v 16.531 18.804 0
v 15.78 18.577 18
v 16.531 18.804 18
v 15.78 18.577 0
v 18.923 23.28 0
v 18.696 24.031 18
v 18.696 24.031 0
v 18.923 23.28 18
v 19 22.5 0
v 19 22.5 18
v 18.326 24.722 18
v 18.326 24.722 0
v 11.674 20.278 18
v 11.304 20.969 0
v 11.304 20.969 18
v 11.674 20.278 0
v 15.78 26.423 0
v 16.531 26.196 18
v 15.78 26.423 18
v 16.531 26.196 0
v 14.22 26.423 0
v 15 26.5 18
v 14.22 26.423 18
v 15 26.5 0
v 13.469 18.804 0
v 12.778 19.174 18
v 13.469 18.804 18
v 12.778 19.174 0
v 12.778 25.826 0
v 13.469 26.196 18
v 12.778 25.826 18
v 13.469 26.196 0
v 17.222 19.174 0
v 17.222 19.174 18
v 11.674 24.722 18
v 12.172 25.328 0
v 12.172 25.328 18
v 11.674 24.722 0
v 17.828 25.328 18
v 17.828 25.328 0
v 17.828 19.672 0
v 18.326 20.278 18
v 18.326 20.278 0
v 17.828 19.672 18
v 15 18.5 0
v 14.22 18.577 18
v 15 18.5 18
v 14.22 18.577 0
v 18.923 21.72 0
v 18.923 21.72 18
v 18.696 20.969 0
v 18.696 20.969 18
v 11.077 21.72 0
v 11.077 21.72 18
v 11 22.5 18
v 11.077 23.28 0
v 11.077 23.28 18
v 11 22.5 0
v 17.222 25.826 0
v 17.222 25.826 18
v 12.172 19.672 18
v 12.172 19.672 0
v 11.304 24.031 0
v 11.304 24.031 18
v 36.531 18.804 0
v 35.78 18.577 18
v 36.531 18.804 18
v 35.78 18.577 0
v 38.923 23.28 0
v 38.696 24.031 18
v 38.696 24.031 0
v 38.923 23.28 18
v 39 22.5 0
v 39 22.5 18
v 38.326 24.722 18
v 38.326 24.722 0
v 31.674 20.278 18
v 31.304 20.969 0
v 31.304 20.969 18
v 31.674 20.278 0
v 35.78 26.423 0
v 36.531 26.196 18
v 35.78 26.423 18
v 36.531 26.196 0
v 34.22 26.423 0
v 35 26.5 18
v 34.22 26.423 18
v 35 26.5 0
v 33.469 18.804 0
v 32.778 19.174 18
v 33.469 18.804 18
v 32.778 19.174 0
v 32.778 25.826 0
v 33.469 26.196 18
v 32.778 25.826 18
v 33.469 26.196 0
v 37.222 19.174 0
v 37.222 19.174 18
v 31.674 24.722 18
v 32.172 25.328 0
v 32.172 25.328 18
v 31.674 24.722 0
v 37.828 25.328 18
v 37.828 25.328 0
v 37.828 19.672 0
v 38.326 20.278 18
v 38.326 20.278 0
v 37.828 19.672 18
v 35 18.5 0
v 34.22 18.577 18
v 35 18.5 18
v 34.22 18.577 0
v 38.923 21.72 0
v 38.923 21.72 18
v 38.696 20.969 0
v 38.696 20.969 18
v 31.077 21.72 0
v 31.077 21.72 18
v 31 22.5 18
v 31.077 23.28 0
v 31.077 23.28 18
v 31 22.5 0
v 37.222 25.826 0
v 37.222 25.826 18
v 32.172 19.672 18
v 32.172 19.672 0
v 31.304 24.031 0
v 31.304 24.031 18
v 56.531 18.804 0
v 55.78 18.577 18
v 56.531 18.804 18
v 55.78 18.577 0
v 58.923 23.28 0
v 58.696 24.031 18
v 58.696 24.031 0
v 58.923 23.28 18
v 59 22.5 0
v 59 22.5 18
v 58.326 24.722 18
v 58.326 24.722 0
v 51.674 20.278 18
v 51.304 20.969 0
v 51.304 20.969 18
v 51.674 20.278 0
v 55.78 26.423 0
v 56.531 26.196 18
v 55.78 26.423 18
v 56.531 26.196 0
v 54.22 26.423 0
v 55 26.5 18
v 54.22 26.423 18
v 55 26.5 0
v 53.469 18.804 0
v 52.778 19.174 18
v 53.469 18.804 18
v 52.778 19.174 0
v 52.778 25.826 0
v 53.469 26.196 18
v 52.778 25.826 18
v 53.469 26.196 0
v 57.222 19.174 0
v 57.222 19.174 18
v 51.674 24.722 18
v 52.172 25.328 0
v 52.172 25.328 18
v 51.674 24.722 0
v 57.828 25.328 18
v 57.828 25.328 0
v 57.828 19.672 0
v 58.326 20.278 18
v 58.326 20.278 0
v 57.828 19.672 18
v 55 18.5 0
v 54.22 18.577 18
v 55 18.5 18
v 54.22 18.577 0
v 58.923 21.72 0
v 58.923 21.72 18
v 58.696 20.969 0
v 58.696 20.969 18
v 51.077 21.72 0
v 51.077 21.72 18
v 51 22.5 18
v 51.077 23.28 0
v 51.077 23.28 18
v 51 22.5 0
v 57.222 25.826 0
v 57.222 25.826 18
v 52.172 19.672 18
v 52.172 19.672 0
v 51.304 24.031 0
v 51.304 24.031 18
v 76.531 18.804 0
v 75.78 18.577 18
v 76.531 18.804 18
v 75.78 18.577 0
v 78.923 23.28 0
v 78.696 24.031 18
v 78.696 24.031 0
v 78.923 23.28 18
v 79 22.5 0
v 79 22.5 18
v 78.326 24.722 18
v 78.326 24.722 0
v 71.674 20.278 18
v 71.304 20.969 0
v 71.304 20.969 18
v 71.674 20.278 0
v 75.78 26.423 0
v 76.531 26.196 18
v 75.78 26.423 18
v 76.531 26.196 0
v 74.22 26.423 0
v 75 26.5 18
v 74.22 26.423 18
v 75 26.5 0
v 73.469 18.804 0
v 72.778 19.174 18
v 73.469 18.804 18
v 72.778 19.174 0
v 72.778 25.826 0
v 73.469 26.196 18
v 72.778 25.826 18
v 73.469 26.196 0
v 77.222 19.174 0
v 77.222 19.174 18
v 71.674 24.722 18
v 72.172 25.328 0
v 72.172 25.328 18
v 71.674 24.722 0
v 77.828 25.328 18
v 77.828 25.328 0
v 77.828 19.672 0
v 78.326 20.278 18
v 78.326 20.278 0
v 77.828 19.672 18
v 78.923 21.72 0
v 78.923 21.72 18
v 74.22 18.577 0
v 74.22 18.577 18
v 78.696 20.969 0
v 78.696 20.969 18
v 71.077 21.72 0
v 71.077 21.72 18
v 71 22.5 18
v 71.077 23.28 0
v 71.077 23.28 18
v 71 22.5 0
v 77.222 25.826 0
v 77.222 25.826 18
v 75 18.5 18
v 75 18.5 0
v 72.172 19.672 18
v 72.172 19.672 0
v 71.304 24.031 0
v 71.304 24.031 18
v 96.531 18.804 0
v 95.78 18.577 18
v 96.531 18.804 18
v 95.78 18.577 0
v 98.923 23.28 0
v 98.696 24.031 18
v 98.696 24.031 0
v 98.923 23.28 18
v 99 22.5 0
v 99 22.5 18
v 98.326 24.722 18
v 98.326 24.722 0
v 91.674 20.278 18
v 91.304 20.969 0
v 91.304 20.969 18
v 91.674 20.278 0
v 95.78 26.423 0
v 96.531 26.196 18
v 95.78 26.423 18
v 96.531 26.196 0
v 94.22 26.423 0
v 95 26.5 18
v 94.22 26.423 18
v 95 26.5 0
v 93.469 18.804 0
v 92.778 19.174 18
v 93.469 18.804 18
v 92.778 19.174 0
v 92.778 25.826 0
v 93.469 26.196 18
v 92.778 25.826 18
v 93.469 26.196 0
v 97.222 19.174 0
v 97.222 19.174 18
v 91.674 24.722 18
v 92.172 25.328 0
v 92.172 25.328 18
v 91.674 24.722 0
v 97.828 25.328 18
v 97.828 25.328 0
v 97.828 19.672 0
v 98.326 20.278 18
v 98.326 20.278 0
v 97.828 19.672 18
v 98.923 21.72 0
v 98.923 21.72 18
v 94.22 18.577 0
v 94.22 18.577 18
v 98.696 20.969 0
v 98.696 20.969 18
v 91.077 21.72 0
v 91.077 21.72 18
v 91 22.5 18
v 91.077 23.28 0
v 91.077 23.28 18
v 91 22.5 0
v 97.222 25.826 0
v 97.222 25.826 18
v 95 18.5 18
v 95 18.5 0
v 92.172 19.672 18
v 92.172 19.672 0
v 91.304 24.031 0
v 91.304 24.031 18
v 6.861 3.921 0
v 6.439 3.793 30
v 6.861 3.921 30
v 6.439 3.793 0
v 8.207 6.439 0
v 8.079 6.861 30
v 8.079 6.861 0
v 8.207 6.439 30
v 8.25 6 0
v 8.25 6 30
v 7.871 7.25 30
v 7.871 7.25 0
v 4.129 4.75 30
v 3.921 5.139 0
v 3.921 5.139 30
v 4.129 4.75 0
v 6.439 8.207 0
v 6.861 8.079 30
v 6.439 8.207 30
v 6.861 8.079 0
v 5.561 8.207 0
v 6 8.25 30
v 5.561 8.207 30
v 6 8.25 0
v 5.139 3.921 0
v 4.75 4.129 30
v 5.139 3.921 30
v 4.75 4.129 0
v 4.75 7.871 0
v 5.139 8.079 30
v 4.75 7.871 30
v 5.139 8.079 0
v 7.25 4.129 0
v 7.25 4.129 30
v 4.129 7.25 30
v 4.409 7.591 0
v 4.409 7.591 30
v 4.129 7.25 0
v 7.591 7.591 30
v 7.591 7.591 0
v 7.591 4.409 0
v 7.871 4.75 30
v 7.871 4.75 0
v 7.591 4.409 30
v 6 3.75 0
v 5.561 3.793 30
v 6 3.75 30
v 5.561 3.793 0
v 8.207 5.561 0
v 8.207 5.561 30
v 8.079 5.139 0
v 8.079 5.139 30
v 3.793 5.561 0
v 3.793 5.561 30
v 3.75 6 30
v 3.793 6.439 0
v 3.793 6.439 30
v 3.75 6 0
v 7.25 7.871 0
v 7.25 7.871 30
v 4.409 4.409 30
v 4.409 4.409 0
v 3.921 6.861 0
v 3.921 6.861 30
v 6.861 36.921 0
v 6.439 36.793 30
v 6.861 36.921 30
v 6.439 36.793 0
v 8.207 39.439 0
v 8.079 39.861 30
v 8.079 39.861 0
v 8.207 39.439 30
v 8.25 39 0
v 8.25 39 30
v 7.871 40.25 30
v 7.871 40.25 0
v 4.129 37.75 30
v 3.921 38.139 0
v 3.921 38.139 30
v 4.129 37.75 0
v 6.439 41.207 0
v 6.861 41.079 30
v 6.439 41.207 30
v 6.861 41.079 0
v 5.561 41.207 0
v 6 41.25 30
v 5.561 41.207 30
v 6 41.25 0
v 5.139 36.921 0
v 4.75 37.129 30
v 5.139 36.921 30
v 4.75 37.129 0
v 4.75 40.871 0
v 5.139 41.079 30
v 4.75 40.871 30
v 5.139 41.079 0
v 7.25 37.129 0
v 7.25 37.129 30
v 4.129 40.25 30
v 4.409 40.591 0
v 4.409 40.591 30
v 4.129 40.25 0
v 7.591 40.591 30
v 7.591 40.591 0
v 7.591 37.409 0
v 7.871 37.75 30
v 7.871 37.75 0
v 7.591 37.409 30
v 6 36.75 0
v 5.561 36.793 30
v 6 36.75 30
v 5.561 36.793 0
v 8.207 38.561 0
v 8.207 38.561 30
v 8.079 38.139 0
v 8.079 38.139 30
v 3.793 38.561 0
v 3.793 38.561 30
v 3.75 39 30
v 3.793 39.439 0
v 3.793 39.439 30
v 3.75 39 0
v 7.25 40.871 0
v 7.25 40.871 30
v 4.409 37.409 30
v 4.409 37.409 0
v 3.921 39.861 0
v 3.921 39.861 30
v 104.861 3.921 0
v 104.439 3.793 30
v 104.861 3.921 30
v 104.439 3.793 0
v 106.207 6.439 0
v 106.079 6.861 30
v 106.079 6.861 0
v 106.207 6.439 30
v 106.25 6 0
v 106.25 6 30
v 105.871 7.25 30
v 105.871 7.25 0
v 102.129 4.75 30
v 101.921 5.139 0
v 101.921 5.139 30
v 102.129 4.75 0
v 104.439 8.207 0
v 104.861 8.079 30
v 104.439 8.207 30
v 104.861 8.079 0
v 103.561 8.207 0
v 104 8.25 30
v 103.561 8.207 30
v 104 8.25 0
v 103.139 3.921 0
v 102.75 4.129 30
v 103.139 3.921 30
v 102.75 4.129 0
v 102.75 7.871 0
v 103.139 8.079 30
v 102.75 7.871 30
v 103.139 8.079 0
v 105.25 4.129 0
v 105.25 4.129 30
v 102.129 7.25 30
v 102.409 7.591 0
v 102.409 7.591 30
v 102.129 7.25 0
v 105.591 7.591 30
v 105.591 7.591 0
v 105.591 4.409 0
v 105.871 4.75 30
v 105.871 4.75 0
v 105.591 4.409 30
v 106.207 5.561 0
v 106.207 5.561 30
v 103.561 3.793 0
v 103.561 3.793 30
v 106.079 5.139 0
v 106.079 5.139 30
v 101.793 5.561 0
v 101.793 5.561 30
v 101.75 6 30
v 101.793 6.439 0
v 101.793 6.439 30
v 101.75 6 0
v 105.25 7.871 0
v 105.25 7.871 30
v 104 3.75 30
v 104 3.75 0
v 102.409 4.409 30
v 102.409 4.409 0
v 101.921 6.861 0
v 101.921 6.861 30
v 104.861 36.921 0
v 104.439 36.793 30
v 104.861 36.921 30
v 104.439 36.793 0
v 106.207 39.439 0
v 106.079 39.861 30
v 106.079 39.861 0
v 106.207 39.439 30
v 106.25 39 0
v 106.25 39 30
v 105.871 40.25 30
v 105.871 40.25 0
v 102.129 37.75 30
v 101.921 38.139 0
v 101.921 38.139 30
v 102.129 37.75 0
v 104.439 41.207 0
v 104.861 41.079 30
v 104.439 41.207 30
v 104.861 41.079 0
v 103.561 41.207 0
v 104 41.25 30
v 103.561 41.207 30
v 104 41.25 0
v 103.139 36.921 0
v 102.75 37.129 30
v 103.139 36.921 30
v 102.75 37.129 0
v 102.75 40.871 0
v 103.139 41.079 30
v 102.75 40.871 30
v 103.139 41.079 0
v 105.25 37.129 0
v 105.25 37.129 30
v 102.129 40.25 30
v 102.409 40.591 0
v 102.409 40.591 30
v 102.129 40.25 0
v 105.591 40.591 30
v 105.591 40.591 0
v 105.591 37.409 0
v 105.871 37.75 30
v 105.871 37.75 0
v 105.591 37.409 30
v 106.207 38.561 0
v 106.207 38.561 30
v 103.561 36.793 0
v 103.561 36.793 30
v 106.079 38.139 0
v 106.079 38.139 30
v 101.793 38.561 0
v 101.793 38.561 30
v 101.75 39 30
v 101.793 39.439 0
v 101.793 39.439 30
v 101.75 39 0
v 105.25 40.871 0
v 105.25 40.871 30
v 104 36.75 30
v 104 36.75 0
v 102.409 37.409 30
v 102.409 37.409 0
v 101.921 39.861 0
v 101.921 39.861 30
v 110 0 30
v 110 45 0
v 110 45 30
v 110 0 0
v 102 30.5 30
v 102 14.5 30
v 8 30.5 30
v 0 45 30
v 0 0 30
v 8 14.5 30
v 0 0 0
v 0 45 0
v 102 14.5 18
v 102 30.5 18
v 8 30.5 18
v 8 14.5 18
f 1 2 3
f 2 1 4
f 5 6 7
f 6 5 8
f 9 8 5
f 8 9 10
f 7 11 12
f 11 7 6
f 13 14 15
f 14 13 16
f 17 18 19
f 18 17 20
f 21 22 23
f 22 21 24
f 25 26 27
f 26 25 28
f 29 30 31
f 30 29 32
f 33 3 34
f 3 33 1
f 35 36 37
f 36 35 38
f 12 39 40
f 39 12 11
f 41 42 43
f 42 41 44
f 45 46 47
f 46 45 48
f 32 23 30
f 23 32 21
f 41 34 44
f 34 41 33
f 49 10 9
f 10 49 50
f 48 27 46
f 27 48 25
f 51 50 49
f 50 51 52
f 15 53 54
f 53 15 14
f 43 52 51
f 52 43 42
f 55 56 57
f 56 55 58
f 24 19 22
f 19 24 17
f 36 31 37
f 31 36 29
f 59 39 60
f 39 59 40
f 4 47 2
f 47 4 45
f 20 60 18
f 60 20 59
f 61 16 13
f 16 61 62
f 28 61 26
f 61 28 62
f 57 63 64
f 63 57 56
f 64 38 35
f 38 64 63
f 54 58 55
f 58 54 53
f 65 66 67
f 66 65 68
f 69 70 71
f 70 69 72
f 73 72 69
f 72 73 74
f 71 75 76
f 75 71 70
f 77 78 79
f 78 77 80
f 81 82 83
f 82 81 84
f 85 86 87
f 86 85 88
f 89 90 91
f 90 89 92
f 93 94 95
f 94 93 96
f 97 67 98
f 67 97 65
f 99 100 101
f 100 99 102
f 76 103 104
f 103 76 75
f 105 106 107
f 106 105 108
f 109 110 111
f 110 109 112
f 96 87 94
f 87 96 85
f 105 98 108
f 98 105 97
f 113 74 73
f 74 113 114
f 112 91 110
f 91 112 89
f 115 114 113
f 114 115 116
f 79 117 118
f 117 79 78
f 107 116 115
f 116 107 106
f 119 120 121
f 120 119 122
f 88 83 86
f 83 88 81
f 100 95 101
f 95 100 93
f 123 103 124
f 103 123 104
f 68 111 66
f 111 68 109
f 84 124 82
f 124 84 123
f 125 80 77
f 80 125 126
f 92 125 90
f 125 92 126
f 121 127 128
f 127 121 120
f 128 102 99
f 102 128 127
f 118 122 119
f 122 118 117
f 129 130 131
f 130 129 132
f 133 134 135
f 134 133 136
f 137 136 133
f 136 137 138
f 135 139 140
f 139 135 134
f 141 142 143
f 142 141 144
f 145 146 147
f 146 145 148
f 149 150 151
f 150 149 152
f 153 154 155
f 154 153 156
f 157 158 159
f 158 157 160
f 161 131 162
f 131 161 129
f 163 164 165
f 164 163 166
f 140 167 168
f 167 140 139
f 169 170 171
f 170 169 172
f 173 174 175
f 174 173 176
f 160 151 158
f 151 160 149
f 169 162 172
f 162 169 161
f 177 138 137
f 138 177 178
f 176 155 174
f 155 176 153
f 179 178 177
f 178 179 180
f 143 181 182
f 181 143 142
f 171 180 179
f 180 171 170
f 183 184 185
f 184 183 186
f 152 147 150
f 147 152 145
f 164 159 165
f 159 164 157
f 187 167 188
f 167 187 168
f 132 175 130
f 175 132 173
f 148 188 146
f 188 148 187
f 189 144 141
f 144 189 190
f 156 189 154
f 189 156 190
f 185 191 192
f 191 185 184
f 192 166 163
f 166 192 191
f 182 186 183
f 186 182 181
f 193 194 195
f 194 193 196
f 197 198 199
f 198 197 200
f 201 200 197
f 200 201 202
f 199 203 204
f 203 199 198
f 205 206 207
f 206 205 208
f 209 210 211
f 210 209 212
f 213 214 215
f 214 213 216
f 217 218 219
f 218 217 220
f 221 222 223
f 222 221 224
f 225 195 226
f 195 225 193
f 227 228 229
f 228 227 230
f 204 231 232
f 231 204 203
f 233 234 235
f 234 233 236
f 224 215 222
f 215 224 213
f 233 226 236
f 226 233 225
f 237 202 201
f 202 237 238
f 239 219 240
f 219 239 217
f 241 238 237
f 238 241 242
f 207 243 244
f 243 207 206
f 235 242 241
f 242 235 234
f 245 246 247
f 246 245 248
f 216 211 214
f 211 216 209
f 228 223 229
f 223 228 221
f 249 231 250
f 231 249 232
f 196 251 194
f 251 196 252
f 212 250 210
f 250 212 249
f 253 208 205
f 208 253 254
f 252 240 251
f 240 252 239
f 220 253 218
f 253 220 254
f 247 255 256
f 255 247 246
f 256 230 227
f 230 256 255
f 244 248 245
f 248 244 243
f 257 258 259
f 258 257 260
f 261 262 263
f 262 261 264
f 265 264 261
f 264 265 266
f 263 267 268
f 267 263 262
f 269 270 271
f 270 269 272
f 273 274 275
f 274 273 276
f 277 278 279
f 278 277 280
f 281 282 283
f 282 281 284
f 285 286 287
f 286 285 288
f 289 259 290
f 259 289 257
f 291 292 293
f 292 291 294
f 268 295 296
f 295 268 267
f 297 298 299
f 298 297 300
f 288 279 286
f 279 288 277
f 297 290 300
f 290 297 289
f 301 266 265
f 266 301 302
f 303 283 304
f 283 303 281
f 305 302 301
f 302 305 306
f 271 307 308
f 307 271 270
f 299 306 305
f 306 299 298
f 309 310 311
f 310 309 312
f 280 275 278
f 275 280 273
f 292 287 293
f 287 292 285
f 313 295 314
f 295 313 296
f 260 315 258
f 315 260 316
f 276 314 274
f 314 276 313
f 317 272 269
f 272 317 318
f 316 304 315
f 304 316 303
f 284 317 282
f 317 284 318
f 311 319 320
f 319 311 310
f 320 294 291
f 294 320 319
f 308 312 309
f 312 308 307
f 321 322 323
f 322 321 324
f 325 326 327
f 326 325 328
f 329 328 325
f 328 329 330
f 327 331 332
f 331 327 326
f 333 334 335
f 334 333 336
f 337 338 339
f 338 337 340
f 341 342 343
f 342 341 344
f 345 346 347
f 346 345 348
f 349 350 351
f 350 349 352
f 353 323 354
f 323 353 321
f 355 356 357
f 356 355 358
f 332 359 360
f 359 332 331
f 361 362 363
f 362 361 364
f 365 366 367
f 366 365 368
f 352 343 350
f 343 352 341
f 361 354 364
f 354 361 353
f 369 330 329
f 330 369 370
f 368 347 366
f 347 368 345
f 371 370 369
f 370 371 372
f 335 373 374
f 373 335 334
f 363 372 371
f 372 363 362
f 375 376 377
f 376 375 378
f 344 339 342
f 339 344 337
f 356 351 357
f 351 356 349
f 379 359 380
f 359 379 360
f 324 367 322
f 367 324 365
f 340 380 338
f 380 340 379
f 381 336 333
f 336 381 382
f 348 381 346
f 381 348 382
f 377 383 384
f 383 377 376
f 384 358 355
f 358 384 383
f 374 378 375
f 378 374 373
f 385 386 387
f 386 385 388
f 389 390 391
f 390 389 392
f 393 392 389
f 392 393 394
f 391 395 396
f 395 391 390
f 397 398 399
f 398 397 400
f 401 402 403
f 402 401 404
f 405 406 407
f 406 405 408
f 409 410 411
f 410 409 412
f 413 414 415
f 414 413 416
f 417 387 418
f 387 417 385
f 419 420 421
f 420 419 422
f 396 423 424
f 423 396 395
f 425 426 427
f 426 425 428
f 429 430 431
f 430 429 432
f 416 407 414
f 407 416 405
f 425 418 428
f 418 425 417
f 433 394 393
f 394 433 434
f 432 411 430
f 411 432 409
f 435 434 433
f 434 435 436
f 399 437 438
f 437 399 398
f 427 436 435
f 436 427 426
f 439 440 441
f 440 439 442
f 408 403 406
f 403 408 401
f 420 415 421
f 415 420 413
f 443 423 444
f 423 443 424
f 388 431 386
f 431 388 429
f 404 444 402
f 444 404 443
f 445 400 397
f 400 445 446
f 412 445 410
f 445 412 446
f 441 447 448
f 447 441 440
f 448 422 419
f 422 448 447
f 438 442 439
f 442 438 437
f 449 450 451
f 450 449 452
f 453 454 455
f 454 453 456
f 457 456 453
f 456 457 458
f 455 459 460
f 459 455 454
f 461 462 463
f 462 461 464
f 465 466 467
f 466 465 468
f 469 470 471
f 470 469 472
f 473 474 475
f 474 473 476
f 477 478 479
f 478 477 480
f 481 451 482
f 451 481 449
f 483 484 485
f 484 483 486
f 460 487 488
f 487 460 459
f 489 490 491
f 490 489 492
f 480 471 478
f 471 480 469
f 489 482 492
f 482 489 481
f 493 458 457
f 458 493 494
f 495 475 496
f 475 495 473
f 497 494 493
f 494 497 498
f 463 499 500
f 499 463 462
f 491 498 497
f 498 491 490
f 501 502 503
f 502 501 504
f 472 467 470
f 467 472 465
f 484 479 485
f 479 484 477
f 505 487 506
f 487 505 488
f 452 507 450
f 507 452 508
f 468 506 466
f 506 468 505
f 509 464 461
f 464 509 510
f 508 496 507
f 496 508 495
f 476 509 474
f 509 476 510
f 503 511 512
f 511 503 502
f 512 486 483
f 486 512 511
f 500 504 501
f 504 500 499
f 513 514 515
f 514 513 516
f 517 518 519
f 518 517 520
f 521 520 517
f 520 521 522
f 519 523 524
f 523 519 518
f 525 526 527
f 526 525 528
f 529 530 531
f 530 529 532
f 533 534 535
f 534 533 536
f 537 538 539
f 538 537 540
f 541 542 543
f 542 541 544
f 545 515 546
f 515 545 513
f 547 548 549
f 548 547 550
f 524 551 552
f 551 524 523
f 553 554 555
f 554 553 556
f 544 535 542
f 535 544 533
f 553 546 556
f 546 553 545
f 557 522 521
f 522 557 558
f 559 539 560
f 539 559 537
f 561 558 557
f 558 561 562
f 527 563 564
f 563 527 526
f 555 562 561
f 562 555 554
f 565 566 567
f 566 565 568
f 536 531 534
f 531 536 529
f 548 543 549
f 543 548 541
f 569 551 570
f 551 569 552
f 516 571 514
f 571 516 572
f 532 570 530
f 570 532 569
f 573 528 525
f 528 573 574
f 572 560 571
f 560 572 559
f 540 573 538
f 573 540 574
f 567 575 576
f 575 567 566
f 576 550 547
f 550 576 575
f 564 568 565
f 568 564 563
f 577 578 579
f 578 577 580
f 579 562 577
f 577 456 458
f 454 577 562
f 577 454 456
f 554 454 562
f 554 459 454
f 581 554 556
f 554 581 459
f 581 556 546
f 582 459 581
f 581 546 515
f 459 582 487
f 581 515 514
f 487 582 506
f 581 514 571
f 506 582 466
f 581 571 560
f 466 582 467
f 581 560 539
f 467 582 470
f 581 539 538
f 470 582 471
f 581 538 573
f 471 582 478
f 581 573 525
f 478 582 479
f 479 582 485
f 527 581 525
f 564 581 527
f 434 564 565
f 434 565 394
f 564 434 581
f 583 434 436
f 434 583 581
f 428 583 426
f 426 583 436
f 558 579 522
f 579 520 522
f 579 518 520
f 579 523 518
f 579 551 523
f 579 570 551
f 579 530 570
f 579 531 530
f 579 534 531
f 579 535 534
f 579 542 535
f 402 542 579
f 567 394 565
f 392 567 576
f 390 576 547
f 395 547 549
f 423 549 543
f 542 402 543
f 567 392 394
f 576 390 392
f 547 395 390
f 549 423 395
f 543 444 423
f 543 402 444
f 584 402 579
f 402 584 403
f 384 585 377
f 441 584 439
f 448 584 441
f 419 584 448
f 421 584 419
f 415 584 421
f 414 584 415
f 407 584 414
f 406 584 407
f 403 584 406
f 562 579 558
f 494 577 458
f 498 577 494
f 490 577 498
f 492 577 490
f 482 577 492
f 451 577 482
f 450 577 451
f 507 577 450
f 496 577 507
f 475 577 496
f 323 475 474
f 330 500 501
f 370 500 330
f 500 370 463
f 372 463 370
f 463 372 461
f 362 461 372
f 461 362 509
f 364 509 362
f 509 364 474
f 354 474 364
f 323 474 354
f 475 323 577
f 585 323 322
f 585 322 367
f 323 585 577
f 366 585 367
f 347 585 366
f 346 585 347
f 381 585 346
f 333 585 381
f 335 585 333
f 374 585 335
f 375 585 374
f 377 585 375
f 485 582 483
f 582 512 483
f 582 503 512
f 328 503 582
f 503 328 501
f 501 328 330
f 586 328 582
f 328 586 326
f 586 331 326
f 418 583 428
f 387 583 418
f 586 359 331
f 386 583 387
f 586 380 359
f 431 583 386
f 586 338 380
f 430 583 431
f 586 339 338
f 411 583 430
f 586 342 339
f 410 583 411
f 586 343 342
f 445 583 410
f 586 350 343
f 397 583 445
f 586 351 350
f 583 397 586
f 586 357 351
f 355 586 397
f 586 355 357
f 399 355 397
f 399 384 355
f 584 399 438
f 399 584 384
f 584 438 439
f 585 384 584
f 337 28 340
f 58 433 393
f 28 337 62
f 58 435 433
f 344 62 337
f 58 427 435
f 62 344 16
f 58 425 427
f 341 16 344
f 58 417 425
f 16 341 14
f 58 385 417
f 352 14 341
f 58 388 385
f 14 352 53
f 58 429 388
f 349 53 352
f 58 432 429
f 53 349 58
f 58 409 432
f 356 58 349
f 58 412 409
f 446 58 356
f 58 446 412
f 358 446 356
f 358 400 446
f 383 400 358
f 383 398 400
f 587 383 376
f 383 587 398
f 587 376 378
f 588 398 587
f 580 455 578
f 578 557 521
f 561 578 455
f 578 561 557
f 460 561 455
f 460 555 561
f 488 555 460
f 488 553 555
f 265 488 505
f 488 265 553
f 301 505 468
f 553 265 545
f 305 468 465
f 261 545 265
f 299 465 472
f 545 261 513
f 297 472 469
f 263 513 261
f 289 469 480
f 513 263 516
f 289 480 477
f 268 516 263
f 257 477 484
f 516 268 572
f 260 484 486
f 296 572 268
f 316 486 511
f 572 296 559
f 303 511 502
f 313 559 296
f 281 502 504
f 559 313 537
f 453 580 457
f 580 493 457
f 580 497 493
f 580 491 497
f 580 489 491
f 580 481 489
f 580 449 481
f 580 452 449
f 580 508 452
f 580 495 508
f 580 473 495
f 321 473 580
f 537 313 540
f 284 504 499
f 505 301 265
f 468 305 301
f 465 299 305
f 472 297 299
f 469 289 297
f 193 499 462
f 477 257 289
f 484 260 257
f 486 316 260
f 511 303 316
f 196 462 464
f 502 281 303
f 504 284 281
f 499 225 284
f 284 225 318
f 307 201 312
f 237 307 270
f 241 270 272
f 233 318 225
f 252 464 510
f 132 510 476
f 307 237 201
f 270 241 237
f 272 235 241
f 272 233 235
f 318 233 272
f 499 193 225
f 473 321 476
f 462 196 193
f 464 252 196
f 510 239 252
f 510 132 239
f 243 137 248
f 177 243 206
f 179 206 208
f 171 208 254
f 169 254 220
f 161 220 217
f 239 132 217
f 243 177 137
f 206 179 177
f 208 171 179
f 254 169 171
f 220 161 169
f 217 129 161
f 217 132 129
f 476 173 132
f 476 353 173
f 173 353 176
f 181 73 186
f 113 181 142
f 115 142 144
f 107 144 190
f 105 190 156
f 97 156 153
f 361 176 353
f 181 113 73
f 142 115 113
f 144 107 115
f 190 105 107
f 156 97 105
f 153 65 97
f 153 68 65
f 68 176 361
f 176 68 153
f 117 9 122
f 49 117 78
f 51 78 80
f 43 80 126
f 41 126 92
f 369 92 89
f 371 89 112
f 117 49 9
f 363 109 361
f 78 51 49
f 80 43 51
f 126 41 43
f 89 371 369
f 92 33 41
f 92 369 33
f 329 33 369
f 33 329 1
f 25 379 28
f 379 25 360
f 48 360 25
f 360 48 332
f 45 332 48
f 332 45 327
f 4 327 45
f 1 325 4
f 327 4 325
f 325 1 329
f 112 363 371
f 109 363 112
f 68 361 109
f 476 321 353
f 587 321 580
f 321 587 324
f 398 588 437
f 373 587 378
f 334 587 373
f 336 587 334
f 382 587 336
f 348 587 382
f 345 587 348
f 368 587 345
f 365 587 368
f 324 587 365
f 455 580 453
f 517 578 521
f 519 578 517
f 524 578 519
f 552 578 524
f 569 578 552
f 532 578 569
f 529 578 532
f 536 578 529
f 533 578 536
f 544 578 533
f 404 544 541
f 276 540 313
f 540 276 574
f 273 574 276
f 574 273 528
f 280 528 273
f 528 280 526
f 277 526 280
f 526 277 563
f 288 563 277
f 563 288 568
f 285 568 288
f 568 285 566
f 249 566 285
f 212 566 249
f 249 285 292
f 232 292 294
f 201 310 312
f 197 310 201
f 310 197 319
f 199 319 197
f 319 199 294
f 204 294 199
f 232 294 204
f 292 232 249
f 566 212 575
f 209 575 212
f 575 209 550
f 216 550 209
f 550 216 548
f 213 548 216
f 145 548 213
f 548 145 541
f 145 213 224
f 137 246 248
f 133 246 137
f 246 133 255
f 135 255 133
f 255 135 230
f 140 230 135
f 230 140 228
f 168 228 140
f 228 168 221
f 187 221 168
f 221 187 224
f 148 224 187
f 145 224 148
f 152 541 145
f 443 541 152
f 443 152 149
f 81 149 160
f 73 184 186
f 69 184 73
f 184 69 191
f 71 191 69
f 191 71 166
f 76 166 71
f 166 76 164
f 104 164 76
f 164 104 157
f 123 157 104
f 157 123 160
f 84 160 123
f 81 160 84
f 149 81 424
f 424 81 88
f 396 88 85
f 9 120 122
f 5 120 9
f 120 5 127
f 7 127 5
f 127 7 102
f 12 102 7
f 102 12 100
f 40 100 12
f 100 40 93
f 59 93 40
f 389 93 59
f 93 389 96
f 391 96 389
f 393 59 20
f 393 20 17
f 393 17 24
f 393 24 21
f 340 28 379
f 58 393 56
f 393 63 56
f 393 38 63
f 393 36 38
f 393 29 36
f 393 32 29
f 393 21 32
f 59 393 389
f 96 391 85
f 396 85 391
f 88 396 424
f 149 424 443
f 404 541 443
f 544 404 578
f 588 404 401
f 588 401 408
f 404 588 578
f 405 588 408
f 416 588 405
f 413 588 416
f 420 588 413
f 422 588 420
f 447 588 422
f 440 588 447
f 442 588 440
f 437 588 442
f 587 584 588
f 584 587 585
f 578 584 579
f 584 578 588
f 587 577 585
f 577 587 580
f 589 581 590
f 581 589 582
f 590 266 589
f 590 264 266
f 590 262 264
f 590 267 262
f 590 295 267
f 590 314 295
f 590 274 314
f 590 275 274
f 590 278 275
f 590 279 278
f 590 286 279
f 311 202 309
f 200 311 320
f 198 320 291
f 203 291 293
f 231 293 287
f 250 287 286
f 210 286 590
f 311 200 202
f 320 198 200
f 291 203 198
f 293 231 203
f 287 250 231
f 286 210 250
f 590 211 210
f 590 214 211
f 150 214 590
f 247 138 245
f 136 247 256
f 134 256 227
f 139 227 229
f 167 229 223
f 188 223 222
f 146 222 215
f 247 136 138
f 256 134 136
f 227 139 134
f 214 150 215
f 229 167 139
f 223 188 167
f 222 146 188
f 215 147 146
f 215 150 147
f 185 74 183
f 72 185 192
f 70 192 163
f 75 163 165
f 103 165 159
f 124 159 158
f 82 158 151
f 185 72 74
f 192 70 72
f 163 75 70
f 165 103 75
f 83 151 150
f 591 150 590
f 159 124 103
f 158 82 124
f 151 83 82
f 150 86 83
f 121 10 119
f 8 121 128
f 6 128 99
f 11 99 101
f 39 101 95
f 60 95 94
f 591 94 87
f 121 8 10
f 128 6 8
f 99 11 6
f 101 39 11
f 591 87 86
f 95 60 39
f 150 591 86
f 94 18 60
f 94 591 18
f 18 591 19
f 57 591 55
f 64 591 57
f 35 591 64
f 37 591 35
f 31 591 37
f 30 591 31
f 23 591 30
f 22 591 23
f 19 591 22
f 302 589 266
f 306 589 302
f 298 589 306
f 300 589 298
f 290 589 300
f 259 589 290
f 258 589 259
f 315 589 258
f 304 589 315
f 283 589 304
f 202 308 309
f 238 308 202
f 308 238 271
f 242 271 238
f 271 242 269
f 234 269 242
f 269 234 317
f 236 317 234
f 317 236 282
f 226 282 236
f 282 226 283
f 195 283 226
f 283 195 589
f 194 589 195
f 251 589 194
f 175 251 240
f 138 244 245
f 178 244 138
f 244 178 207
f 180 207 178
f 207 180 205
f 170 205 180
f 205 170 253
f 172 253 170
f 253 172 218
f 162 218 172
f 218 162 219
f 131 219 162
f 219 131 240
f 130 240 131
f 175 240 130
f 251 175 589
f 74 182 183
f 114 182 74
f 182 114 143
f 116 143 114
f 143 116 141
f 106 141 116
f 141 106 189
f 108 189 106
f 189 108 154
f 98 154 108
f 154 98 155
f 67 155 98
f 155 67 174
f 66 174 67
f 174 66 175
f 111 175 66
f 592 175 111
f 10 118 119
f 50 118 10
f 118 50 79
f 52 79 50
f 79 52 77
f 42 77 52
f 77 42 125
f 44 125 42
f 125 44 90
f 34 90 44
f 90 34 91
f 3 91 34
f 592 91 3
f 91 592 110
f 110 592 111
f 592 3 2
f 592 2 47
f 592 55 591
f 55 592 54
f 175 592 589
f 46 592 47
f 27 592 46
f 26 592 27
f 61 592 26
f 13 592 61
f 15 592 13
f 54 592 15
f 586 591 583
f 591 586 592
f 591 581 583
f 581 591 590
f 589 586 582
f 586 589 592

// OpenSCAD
$fn = 32;

// ----------------------------------------------------------------------
// Manifold block: gallery_top manifold
// ----------------------------------------------------------------------

// --- parameters (mm) ---
block_l = 110;            // block length, X
block_w = 45;             // block width, Y
block_h = 30;             // block height, Z
port_d = 8;               // port bore diameter
port_pitch = 20;          // port pitch along X
gallery_d = 16;           // top gallery width, Y
gallery_depth = 12;       // gallery pocket depth
wall_p = 8;               // gallery end wall thickness, X
mnt_d = 4.5;              // mounting hole diameter
mnt_in = 6;               // mounting hole inset from the edges

n_ports = 5;  // ports in the row
port_x0 = (block_l - (n_ports - 1) * port_pitch) / 2;  // first port X

difference() {
  cube([block_l, block_w, block_h]);
  for (i = [0 : n_ports - 1])
    translate([port_x0 + i * port_pitch, block_w / 2, -1])
      cylinder(h = block_h + 2, d = port_d);
  translate([wall_p, block_w / 2 - gallery_d / 2, block_h - gallery_depth])
    cube([block_l - 2 * wall_p, gallery_d, gallery_depth + 1]);
  for (cx = [mnt_in, block_l - mnt_in])
    for (cy = [mnt_in, block_w - mnt_in])
      translate([cx, cy, -1]) cylinder(h = block_h + 2, d = mnt_d);
}
